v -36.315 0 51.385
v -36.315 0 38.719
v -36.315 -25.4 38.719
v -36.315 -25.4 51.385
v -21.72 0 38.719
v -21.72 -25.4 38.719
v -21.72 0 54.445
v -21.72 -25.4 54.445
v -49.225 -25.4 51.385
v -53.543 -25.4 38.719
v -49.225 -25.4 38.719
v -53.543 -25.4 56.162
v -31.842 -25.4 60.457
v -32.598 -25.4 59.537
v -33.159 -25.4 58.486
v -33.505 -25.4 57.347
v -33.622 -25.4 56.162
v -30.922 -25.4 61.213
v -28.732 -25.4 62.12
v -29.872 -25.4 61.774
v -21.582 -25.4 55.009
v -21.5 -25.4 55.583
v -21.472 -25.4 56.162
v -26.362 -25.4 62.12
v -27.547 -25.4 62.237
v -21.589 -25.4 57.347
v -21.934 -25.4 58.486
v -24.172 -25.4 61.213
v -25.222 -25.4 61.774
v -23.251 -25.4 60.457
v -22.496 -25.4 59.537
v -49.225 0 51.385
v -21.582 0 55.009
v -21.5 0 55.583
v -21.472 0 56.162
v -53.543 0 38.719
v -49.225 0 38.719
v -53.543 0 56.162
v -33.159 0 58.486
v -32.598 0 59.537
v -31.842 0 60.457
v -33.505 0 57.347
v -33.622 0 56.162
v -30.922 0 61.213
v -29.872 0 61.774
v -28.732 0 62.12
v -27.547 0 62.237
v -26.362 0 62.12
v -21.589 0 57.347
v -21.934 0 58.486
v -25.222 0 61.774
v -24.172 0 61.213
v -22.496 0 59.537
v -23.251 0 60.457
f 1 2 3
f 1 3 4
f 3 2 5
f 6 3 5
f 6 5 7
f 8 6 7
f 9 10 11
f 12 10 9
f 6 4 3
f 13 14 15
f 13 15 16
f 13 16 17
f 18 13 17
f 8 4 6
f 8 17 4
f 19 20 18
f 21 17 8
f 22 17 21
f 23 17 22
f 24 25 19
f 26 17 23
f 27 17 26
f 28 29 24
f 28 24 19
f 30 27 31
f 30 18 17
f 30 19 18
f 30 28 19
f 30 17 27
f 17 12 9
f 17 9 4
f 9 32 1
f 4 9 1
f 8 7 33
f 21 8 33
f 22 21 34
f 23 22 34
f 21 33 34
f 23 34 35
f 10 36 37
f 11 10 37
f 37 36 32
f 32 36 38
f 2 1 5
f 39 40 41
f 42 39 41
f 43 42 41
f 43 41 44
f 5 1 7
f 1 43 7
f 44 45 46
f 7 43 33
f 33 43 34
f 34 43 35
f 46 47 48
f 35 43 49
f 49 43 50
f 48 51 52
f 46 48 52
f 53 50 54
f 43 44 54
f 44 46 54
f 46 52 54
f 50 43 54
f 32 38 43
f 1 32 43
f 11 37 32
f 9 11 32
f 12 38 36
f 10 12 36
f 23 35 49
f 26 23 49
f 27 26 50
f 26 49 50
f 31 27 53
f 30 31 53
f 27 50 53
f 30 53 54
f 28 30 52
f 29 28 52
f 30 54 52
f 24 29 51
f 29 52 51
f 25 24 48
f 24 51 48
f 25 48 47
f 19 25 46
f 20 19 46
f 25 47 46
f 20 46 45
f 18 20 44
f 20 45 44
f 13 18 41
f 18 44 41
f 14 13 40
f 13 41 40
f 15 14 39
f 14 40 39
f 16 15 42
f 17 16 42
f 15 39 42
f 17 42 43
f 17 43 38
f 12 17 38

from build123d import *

# Parameters (mm, degrees)
F1_DEPTH = 25.4
F2_W     = 12.9091180861
F2_H     = 25.0910650939
F3_DEPTH = 28.702


with BuildPart() as f1:
    # F0 (on Front) → F1 (new body)
    with BuildSketch(Plane.XZ):
        with BuildLine():
            Line((-33.6216918521, 56.1617612839), (-53.54340747, 56.1617612839))
            Line((-53.54340747, 56.1617612839), (-53.54340747, 38.7188270688))
            Line((-53.54340747, 38.7188270688), (-21.719571203, 38.7188270688))
            Line((-21.719571203, 38.7188270688), (-21.719571203, 54.4453912809))
            ThreePointArc((-21.719571203, 54.4453912809), (-28.4139375356, 50.1491411825), (-33.6216918521, 56.1617612839))
        make_face()
        with BuildLine():
            ThreePointArc((-21.4720585056, 56.1617612839), (-27.5468751788, 62.2365779571), (-33.6216918521, 56.1617612839))
            Line((-33.6216918521, 56.1617612839), (-21.719571203, 56.1617612839))
            Line((-21.719571203, 56.1617612839), (-21.719571203, 54.4453912809))
            ThreePointArc((-21.719571203, 54.4453912809), (-21.5342550775, 55.2946989271), (-21.4720585056, 56.1617612839))
        make_face()
        with BuildLine():
            Line((-21.719571203, 56.1617612839), (-33.6216918521, 56.1617612839))
            ThreePointArc((-33.6216918521, 56.1617612839), (-28.4139375356, 50.1491411825), (-21.719571203, 54.4453912809))
            Line((-21.719571203, 54.4453912809), (-21.719571203, 56.1617612839))
        make_face()
    extrude(amount=F1_DEPTH)

    # F2 (on Front) → F3 (cut)
    with BuildSketch(Plane.XZ):
        with Locations((-42.769966647, 38.8393672183)):
            Rectangle(F2_W, F2_H)
    extrude(amount=F3_DEPTH, mode=Mode.SUBTRACT)


solid = f1.part
